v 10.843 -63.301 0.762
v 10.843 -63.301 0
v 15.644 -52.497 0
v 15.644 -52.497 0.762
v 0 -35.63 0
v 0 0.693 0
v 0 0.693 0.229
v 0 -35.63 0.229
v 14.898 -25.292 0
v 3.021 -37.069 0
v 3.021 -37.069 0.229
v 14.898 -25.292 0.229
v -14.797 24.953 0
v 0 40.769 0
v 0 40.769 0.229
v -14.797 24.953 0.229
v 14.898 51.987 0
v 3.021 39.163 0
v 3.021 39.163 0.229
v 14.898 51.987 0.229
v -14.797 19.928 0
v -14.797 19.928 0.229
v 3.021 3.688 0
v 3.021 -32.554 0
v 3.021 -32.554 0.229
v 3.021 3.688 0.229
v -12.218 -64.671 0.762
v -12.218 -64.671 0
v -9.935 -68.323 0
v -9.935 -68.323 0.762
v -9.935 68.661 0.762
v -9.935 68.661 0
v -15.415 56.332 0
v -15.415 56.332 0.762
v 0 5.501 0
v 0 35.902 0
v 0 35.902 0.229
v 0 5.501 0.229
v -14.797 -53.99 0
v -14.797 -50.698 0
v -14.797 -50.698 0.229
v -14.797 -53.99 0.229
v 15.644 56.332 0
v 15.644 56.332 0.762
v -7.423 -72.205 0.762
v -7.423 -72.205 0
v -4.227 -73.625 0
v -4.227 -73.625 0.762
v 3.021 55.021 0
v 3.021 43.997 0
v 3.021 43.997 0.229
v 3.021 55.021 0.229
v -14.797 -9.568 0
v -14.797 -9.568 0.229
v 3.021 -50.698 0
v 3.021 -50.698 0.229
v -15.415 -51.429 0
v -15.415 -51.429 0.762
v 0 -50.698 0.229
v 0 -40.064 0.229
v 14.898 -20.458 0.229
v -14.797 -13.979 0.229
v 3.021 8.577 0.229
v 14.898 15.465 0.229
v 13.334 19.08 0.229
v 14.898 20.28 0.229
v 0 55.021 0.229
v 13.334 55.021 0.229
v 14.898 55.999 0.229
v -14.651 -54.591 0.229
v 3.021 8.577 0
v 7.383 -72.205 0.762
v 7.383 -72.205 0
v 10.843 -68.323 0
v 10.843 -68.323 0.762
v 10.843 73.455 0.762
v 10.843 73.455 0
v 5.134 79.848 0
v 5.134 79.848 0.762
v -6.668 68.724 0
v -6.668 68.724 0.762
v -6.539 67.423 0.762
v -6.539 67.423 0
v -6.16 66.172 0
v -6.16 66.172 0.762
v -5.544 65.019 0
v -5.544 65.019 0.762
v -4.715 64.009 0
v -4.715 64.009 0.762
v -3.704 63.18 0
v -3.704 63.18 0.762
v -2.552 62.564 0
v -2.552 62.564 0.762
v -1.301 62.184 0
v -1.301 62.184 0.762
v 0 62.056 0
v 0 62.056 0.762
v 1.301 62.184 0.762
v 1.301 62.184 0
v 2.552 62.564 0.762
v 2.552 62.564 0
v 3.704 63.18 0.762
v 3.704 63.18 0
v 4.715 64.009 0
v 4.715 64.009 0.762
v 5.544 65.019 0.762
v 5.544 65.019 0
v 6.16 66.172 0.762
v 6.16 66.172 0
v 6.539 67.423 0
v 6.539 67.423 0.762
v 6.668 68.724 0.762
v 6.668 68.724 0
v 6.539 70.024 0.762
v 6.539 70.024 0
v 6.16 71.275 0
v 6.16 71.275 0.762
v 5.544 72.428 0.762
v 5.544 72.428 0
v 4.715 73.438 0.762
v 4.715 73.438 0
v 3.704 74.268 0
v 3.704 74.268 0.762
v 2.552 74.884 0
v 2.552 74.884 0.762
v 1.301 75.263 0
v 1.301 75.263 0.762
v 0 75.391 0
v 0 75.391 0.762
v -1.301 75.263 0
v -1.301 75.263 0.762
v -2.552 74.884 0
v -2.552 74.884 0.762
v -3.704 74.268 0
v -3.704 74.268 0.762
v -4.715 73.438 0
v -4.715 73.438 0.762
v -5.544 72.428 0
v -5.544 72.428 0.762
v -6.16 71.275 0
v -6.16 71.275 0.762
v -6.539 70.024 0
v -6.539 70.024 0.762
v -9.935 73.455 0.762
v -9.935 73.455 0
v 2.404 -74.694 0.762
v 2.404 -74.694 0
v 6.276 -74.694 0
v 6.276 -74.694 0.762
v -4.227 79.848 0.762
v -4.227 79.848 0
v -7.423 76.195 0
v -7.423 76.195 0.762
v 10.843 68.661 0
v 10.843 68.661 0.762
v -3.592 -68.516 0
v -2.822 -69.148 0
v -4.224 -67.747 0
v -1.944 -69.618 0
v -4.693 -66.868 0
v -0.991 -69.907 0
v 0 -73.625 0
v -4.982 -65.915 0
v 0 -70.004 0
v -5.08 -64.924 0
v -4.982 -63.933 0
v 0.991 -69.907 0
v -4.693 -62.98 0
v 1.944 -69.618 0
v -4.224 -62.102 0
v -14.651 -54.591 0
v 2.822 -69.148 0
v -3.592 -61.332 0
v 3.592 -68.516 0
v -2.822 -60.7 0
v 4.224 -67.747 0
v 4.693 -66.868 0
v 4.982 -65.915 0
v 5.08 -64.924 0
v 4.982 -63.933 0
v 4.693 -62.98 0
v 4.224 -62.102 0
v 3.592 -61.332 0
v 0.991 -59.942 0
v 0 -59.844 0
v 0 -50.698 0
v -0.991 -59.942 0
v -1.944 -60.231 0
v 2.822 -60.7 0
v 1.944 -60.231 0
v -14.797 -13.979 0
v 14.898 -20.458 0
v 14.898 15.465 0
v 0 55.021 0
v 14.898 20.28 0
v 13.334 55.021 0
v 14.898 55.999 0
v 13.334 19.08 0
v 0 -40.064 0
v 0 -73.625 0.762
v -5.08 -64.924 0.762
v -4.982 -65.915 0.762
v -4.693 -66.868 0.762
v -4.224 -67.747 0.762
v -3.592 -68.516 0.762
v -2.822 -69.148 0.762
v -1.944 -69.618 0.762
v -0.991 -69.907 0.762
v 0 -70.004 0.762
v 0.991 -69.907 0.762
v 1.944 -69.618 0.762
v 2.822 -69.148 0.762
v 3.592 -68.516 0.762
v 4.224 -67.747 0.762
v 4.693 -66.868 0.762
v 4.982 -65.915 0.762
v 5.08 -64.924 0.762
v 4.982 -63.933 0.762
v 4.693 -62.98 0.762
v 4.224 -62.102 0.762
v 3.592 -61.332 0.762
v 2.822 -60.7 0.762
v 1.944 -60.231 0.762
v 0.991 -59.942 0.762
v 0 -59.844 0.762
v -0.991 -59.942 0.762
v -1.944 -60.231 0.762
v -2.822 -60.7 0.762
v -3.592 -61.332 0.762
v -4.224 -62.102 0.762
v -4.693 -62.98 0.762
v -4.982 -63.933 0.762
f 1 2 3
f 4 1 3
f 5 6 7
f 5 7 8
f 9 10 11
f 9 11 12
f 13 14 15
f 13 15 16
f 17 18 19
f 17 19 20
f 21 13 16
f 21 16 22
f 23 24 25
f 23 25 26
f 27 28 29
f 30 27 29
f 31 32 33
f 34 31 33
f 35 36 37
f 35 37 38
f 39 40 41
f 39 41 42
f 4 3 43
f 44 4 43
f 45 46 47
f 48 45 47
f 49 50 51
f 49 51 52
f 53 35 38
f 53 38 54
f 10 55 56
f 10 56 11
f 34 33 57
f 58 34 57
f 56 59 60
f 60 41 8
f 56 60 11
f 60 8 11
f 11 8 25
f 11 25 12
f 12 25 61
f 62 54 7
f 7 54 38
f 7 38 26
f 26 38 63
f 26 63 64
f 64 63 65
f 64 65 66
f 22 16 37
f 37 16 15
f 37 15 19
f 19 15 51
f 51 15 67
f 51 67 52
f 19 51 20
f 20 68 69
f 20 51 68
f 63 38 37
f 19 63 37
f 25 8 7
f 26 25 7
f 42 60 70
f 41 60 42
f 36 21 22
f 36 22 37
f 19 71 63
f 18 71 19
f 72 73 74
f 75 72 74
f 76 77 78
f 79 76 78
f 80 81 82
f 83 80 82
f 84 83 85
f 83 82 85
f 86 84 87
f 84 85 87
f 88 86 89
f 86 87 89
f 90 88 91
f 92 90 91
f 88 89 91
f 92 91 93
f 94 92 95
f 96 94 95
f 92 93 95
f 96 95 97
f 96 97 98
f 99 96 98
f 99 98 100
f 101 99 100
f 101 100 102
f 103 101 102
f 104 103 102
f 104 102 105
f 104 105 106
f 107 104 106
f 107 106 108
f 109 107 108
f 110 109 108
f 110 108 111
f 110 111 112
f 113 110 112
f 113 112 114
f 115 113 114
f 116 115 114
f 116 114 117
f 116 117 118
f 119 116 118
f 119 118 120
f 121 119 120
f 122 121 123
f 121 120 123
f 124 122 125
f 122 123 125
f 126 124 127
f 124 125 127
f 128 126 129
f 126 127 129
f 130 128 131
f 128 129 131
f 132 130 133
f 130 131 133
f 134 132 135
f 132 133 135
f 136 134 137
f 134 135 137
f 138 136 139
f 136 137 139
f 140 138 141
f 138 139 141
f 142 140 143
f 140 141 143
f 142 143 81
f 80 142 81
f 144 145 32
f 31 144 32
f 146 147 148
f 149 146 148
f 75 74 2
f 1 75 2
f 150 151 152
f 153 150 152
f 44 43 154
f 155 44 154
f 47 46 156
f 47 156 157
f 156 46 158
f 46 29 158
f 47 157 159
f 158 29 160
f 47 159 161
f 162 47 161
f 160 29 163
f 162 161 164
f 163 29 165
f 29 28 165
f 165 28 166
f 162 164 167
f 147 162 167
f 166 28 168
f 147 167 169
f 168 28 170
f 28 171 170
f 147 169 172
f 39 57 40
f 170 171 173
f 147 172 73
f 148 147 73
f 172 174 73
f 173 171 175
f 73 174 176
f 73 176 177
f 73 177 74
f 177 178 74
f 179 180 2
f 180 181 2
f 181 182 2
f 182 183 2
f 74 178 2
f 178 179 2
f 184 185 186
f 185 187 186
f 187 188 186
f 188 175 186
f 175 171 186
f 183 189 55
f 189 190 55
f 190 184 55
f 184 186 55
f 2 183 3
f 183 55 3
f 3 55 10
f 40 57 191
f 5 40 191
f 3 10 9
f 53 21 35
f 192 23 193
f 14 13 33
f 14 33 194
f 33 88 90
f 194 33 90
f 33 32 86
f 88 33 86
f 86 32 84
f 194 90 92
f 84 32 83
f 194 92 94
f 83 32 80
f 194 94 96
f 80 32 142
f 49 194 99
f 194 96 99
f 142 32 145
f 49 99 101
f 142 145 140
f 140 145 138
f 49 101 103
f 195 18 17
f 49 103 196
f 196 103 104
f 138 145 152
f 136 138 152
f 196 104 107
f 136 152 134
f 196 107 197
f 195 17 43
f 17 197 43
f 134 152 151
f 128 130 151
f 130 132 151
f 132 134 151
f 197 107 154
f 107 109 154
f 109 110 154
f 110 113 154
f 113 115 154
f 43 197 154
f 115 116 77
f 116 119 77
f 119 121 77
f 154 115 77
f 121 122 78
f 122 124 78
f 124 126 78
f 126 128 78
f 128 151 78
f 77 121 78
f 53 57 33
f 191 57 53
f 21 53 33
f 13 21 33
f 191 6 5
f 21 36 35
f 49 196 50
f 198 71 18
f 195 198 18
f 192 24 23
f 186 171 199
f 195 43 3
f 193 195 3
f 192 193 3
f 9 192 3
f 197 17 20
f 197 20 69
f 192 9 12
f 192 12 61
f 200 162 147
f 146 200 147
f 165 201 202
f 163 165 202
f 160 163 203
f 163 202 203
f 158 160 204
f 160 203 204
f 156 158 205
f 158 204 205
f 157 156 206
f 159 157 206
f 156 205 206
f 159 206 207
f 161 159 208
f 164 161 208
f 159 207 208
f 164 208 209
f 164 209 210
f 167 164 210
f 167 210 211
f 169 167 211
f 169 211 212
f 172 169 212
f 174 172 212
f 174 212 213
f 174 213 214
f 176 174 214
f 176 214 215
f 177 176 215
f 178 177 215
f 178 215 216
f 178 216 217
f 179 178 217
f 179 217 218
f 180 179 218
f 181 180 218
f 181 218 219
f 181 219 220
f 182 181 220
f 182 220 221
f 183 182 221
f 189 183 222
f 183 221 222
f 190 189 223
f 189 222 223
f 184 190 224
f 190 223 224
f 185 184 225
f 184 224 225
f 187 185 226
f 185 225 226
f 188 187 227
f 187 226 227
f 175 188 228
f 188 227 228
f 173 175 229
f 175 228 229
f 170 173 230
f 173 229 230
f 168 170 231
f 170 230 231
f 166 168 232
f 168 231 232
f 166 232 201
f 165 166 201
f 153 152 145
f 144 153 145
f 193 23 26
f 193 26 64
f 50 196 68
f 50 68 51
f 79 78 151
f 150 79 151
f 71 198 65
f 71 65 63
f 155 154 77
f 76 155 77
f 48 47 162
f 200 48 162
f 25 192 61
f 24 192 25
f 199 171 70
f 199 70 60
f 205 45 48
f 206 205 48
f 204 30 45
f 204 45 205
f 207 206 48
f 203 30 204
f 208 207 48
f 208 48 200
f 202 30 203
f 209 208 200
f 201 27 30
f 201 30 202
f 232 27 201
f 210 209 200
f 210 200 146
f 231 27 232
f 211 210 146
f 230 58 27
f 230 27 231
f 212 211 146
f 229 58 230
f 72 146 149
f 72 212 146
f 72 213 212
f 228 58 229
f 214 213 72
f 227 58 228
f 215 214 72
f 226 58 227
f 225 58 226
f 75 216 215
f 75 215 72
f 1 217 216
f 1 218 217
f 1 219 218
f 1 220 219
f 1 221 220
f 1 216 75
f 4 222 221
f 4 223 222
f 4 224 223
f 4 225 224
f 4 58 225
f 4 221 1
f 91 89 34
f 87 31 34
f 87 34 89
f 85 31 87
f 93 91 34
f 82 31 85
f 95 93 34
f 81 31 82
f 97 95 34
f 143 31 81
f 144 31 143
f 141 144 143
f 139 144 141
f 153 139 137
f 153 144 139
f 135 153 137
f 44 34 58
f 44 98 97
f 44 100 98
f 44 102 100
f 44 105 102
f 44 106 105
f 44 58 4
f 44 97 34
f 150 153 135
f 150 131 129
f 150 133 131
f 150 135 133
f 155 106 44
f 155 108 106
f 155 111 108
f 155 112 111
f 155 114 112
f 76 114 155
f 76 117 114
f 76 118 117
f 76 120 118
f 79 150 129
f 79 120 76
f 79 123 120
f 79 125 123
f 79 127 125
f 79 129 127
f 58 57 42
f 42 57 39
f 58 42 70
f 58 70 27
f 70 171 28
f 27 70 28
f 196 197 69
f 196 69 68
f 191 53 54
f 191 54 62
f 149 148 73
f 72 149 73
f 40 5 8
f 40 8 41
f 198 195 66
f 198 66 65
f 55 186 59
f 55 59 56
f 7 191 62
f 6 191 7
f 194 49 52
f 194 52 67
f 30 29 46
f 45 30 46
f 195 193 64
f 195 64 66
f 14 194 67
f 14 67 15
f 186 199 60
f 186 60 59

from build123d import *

# Parameters (mm, degrees)
F2_DEPTH = 0.762
F3_D     = 13.335
F4_D     = 10.16
F6_DEPTH = 0.2286


with BuildPart() as f2:
    # F1 (on Top) → F2 (new body)
    with BuildSketch(Plane.XY):
        Polygon((5.1344926469, 79.8476114869), (0, 79.8476114869), (-4.2268559337, 79.8476114869), (-7.4234125204, 76.1947035789), (-9.9349934608, 73.4550207853), (-9.9349934608, 68.6605796218), (-15.4148070142, 56.3320219517), (-15.4148070142, -51.4287278056), (-12.2182490304, -64.6705105901), (-9.9349934608, -68.323418498), (-7.4234125204, -72.2046345472), (-4.2268559337, -73.6254442297), (0, -73.6254442297), (2.4043139854, -74.6941168771), (6.2761204317, -74.6941168771), (7.382648817, -72.2046345472), (10.842631571, -68.323418498), (10.842631571, -63.3006691933), (15.6444913902, -52.4973808827), (15.6444913902, -7.1372324601), (15.6444913902, 14.5519021899), (15.6444913902, 38.0674898624), (15.6444913902, 52.4508096278), (15.6444913902, 56.3320219517), (10.842631571, 68.6605796218), (10.842631571, 73.4550207853), align=None)
    extrude(amount=F2_DEPTH)

    # F3 (through all)
    with Locations(Plane(origin=(0, 0, 0), x_dir=(1, 0, 0), z_dir=(0, 0, -1))):
        with Locations((0, -68.7236785889)):
            Hole(F3_D / 2)

    # F4 (through all)
    with Locations(Plane(origin=(0, 0, 0), x_dir=(1, 0, 0), z_dir=(0, 0, -1))):
        with Locations((0, 64.9243146181)):
            Hole(F4_D / 2)

    # F5 (on Top) → F6 (cut)
    with BuildSketch(Plane.XY):
        Polygon((14.8983420804, 55.9992268682), (13.3339157328, 55.0209134817), (3.0205850489, 43.9974281211), (3.0205850489, 39.1634636204), (14.8983420804, 51.9865565002), align=None)
        Polygon((3.0205850489, 39.1634636204), (3.0205850489, 43.9974281211), (0, 40.7688518165), (0, 35.9024739797), align=None)
        Polygon((0, 40.7688518165), (3.0205850489, 43.9974281211), (3.0205850489, 55.0209134817), (0, 55.0209134817), align=None)
        Polygon((0, 35.9024739797), (0, 40.7688518165), (-14.7966286168, 24.9533578753), (-14.7966286168, 19.9282001704), align=None)
        Polygon((3.0205850489, 8.5766670856), (3.0205850489, 39.1634636204), (0, 35.9024739797), (0, 5.5005631668), align=None)
        Polygon((3.0205850489, 3.6877155311), (3.0205850489, 8.5766670856), (0, 5.5005631668), (0, 0.6926685426), align=None)
        Polygon((13.3339157328, 19.0795585513), (3.0205850489, 8.5766670856), (3.0205850489, 3.6877155311), (14.8983420804, 15.4650500044), (14.8983420804, 20.2802531421), align=None)
        Polygon((0, 0.6926685426), (0, 5.5005631668), (-14.7966286168, -9.5680300146), (-14.7966286168, -13.9788594097), align=None)
        Polygon((3.0205850489, -32.5537367418), (3.0205850489, 3.6877155311), (0, 0.6926685426), (0, -35.6298406606), align=None)
        Polygon((3.0205850489, -37.0688434684), (3.0205850489, -32.5537367418), (0, -35.6298406606), (0, -40.0638904568), align=None)
        Polygon((14.8983420804, -20.4576645046), (3.0205850489, -32.5537367418), (3.0205850489, -37.0688434684), (14.8983420804, -25.291508995), align=None)
        Polygon((0, -40.0638904568), (0, -35.6298406606), (-14.7966286168, -50.698433842), (-14.7966286168, -54.7354184091), align=None)
        Polygon((3.0205850489, -50.698433842), (3.0205850489, -37.0688434684), (0, -40.0638904568), (0, -50.698433842), align=None)
    extrude(amount=F6_DEPTH, mode=Mode.SUBTRACT)


solid = f2.part
